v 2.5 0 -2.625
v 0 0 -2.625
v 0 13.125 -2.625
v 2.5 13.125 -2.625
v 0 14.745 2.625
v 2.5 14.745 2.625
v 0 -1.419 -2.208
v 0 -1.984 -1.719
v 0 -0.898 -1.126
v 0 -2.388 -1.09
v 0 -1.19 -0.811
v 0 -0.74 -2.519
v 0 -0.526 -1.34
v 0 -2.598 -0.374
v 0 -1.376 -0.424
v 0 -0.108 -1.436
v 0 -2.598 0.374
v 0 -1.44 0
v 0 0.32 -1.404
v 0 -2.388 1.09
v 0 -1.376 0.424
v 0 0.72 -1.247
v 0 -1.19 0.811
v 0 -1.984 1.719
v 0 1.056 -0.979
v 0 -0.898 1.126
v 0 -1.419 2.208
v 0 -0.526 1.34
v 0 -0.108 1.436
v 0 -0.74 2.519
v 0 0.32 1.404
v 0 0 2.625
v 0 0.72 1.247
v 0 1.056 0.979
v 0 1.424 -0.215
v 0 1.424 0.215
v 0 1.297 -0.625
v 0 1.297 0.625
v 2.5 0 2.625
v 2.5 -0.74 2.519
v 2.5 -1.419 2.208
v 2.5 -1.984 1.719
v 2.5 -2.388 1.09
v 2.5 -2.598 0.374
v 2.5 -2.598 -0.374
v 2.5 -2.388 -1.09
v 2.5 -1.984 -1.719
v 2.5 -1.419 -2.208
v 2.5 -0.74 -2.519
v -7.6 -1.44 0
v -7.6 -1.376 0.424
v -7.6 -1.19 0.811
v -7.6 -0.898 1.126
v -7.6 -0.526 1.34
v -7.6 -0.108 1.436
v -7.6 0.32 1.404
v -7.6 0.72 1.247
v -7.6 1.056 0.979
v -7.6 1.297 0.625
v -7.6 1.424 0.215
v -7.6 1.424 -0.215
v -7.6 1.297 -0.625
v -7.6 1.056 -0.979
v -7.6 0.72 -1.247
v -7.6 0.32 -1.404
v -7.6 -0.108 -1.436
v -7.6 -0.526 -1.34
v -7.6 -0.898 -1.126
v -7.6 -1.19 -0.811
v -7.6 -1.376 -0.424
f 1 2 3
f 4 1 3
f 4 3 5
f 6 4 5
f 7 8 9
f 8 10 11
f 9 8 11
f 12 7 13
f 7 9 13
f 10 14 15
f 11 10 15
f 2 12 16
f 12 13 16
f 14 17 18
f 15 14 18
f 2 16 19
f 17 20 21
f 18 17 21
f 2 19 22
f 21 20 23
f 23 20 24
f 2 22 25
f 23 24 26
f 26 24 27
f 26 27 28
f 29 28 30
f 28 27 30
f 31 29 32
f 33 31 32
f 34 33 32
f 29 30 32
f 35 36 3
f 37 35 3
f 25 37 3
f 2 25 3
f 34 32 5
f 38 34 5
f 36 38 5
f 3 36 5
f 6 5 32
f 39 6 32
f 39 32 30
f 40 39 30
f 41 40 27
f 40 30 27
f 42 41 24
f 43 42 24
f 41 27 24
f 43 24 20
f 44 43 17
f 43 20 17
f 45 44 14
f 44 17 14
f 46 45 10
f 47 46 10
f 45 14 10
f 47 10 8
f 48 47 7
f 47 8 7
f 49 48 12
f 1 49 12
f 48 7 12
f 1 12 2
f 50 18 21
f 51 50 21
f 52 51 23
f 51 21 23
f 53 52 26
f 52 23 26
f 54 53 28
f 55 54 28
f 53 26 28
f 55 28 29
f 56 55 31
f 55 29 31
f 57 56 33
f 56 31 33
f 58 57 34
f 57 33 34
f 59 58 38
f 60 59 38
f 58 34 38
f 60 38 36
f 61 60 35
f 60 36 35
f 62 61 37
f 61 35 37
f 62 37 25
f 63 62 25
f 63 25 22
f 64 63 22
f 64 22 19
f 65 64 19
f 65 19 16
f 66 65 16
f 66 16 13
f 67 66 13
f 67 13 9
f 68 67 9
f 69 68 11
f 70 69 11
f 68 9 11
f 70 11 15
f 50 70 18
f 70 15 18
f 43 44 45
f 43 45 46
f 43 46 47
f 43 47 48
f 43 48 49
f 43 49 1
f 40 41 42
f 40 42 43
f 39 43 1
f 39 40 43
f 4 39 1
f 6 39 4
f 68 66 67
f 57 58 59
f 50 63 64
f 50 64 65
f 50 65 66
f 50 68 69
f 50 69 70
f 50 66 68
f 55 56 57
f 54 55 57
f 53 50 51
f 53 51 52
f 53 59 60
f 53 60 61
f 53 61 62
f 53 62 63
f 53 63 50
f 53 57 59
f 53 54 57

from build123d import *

# Parameters (mm, degrees)
F1_DEPTH = 2.5
F2_R     = 1.44
F3_DEPTH = 7.6


with BuildPart() as f1:
    # F0 (on Right) → F1 (new body)
    with BuildSketch(Plane.YZ):
        with BuildLine():
            ThreePointArc((0, -2.625), (1.856155, -1.856155), (2.625, 0))
            ThreePointArc((2.625, 0), (1.856155, 1.856155), (0, 2.625))
            ThreePointArc((0, 2.625), (-2.625, 0), (0, -2.625))
        make_face()
        with BuildLine():
            ThreePointArc((0, 2.625), (1.856155, 1.856155), (2.625, 0))
            ThreePointArc((2.625, 0), (1.856155, -1.856155), (0, -2.625))
            Line((0, -2.625), (13.125, -2.625))
            Line((13.125, -2.625), (14.745, 2.625))
            Line((14.745, 2.625), (0, 2.625))
        make_face()
    extrude(amount=F1_DEPTH)

    # F2 (on face) → F3 (join)
    with BuildSketch(Plane(origin=(0, 0, 0), x_dir=(0, -1, 0), z_dir=(-1, 0, 0))):
        Circle(F2_R)
    extrude(amount=F3_DEPTH)


solid = f1.part
